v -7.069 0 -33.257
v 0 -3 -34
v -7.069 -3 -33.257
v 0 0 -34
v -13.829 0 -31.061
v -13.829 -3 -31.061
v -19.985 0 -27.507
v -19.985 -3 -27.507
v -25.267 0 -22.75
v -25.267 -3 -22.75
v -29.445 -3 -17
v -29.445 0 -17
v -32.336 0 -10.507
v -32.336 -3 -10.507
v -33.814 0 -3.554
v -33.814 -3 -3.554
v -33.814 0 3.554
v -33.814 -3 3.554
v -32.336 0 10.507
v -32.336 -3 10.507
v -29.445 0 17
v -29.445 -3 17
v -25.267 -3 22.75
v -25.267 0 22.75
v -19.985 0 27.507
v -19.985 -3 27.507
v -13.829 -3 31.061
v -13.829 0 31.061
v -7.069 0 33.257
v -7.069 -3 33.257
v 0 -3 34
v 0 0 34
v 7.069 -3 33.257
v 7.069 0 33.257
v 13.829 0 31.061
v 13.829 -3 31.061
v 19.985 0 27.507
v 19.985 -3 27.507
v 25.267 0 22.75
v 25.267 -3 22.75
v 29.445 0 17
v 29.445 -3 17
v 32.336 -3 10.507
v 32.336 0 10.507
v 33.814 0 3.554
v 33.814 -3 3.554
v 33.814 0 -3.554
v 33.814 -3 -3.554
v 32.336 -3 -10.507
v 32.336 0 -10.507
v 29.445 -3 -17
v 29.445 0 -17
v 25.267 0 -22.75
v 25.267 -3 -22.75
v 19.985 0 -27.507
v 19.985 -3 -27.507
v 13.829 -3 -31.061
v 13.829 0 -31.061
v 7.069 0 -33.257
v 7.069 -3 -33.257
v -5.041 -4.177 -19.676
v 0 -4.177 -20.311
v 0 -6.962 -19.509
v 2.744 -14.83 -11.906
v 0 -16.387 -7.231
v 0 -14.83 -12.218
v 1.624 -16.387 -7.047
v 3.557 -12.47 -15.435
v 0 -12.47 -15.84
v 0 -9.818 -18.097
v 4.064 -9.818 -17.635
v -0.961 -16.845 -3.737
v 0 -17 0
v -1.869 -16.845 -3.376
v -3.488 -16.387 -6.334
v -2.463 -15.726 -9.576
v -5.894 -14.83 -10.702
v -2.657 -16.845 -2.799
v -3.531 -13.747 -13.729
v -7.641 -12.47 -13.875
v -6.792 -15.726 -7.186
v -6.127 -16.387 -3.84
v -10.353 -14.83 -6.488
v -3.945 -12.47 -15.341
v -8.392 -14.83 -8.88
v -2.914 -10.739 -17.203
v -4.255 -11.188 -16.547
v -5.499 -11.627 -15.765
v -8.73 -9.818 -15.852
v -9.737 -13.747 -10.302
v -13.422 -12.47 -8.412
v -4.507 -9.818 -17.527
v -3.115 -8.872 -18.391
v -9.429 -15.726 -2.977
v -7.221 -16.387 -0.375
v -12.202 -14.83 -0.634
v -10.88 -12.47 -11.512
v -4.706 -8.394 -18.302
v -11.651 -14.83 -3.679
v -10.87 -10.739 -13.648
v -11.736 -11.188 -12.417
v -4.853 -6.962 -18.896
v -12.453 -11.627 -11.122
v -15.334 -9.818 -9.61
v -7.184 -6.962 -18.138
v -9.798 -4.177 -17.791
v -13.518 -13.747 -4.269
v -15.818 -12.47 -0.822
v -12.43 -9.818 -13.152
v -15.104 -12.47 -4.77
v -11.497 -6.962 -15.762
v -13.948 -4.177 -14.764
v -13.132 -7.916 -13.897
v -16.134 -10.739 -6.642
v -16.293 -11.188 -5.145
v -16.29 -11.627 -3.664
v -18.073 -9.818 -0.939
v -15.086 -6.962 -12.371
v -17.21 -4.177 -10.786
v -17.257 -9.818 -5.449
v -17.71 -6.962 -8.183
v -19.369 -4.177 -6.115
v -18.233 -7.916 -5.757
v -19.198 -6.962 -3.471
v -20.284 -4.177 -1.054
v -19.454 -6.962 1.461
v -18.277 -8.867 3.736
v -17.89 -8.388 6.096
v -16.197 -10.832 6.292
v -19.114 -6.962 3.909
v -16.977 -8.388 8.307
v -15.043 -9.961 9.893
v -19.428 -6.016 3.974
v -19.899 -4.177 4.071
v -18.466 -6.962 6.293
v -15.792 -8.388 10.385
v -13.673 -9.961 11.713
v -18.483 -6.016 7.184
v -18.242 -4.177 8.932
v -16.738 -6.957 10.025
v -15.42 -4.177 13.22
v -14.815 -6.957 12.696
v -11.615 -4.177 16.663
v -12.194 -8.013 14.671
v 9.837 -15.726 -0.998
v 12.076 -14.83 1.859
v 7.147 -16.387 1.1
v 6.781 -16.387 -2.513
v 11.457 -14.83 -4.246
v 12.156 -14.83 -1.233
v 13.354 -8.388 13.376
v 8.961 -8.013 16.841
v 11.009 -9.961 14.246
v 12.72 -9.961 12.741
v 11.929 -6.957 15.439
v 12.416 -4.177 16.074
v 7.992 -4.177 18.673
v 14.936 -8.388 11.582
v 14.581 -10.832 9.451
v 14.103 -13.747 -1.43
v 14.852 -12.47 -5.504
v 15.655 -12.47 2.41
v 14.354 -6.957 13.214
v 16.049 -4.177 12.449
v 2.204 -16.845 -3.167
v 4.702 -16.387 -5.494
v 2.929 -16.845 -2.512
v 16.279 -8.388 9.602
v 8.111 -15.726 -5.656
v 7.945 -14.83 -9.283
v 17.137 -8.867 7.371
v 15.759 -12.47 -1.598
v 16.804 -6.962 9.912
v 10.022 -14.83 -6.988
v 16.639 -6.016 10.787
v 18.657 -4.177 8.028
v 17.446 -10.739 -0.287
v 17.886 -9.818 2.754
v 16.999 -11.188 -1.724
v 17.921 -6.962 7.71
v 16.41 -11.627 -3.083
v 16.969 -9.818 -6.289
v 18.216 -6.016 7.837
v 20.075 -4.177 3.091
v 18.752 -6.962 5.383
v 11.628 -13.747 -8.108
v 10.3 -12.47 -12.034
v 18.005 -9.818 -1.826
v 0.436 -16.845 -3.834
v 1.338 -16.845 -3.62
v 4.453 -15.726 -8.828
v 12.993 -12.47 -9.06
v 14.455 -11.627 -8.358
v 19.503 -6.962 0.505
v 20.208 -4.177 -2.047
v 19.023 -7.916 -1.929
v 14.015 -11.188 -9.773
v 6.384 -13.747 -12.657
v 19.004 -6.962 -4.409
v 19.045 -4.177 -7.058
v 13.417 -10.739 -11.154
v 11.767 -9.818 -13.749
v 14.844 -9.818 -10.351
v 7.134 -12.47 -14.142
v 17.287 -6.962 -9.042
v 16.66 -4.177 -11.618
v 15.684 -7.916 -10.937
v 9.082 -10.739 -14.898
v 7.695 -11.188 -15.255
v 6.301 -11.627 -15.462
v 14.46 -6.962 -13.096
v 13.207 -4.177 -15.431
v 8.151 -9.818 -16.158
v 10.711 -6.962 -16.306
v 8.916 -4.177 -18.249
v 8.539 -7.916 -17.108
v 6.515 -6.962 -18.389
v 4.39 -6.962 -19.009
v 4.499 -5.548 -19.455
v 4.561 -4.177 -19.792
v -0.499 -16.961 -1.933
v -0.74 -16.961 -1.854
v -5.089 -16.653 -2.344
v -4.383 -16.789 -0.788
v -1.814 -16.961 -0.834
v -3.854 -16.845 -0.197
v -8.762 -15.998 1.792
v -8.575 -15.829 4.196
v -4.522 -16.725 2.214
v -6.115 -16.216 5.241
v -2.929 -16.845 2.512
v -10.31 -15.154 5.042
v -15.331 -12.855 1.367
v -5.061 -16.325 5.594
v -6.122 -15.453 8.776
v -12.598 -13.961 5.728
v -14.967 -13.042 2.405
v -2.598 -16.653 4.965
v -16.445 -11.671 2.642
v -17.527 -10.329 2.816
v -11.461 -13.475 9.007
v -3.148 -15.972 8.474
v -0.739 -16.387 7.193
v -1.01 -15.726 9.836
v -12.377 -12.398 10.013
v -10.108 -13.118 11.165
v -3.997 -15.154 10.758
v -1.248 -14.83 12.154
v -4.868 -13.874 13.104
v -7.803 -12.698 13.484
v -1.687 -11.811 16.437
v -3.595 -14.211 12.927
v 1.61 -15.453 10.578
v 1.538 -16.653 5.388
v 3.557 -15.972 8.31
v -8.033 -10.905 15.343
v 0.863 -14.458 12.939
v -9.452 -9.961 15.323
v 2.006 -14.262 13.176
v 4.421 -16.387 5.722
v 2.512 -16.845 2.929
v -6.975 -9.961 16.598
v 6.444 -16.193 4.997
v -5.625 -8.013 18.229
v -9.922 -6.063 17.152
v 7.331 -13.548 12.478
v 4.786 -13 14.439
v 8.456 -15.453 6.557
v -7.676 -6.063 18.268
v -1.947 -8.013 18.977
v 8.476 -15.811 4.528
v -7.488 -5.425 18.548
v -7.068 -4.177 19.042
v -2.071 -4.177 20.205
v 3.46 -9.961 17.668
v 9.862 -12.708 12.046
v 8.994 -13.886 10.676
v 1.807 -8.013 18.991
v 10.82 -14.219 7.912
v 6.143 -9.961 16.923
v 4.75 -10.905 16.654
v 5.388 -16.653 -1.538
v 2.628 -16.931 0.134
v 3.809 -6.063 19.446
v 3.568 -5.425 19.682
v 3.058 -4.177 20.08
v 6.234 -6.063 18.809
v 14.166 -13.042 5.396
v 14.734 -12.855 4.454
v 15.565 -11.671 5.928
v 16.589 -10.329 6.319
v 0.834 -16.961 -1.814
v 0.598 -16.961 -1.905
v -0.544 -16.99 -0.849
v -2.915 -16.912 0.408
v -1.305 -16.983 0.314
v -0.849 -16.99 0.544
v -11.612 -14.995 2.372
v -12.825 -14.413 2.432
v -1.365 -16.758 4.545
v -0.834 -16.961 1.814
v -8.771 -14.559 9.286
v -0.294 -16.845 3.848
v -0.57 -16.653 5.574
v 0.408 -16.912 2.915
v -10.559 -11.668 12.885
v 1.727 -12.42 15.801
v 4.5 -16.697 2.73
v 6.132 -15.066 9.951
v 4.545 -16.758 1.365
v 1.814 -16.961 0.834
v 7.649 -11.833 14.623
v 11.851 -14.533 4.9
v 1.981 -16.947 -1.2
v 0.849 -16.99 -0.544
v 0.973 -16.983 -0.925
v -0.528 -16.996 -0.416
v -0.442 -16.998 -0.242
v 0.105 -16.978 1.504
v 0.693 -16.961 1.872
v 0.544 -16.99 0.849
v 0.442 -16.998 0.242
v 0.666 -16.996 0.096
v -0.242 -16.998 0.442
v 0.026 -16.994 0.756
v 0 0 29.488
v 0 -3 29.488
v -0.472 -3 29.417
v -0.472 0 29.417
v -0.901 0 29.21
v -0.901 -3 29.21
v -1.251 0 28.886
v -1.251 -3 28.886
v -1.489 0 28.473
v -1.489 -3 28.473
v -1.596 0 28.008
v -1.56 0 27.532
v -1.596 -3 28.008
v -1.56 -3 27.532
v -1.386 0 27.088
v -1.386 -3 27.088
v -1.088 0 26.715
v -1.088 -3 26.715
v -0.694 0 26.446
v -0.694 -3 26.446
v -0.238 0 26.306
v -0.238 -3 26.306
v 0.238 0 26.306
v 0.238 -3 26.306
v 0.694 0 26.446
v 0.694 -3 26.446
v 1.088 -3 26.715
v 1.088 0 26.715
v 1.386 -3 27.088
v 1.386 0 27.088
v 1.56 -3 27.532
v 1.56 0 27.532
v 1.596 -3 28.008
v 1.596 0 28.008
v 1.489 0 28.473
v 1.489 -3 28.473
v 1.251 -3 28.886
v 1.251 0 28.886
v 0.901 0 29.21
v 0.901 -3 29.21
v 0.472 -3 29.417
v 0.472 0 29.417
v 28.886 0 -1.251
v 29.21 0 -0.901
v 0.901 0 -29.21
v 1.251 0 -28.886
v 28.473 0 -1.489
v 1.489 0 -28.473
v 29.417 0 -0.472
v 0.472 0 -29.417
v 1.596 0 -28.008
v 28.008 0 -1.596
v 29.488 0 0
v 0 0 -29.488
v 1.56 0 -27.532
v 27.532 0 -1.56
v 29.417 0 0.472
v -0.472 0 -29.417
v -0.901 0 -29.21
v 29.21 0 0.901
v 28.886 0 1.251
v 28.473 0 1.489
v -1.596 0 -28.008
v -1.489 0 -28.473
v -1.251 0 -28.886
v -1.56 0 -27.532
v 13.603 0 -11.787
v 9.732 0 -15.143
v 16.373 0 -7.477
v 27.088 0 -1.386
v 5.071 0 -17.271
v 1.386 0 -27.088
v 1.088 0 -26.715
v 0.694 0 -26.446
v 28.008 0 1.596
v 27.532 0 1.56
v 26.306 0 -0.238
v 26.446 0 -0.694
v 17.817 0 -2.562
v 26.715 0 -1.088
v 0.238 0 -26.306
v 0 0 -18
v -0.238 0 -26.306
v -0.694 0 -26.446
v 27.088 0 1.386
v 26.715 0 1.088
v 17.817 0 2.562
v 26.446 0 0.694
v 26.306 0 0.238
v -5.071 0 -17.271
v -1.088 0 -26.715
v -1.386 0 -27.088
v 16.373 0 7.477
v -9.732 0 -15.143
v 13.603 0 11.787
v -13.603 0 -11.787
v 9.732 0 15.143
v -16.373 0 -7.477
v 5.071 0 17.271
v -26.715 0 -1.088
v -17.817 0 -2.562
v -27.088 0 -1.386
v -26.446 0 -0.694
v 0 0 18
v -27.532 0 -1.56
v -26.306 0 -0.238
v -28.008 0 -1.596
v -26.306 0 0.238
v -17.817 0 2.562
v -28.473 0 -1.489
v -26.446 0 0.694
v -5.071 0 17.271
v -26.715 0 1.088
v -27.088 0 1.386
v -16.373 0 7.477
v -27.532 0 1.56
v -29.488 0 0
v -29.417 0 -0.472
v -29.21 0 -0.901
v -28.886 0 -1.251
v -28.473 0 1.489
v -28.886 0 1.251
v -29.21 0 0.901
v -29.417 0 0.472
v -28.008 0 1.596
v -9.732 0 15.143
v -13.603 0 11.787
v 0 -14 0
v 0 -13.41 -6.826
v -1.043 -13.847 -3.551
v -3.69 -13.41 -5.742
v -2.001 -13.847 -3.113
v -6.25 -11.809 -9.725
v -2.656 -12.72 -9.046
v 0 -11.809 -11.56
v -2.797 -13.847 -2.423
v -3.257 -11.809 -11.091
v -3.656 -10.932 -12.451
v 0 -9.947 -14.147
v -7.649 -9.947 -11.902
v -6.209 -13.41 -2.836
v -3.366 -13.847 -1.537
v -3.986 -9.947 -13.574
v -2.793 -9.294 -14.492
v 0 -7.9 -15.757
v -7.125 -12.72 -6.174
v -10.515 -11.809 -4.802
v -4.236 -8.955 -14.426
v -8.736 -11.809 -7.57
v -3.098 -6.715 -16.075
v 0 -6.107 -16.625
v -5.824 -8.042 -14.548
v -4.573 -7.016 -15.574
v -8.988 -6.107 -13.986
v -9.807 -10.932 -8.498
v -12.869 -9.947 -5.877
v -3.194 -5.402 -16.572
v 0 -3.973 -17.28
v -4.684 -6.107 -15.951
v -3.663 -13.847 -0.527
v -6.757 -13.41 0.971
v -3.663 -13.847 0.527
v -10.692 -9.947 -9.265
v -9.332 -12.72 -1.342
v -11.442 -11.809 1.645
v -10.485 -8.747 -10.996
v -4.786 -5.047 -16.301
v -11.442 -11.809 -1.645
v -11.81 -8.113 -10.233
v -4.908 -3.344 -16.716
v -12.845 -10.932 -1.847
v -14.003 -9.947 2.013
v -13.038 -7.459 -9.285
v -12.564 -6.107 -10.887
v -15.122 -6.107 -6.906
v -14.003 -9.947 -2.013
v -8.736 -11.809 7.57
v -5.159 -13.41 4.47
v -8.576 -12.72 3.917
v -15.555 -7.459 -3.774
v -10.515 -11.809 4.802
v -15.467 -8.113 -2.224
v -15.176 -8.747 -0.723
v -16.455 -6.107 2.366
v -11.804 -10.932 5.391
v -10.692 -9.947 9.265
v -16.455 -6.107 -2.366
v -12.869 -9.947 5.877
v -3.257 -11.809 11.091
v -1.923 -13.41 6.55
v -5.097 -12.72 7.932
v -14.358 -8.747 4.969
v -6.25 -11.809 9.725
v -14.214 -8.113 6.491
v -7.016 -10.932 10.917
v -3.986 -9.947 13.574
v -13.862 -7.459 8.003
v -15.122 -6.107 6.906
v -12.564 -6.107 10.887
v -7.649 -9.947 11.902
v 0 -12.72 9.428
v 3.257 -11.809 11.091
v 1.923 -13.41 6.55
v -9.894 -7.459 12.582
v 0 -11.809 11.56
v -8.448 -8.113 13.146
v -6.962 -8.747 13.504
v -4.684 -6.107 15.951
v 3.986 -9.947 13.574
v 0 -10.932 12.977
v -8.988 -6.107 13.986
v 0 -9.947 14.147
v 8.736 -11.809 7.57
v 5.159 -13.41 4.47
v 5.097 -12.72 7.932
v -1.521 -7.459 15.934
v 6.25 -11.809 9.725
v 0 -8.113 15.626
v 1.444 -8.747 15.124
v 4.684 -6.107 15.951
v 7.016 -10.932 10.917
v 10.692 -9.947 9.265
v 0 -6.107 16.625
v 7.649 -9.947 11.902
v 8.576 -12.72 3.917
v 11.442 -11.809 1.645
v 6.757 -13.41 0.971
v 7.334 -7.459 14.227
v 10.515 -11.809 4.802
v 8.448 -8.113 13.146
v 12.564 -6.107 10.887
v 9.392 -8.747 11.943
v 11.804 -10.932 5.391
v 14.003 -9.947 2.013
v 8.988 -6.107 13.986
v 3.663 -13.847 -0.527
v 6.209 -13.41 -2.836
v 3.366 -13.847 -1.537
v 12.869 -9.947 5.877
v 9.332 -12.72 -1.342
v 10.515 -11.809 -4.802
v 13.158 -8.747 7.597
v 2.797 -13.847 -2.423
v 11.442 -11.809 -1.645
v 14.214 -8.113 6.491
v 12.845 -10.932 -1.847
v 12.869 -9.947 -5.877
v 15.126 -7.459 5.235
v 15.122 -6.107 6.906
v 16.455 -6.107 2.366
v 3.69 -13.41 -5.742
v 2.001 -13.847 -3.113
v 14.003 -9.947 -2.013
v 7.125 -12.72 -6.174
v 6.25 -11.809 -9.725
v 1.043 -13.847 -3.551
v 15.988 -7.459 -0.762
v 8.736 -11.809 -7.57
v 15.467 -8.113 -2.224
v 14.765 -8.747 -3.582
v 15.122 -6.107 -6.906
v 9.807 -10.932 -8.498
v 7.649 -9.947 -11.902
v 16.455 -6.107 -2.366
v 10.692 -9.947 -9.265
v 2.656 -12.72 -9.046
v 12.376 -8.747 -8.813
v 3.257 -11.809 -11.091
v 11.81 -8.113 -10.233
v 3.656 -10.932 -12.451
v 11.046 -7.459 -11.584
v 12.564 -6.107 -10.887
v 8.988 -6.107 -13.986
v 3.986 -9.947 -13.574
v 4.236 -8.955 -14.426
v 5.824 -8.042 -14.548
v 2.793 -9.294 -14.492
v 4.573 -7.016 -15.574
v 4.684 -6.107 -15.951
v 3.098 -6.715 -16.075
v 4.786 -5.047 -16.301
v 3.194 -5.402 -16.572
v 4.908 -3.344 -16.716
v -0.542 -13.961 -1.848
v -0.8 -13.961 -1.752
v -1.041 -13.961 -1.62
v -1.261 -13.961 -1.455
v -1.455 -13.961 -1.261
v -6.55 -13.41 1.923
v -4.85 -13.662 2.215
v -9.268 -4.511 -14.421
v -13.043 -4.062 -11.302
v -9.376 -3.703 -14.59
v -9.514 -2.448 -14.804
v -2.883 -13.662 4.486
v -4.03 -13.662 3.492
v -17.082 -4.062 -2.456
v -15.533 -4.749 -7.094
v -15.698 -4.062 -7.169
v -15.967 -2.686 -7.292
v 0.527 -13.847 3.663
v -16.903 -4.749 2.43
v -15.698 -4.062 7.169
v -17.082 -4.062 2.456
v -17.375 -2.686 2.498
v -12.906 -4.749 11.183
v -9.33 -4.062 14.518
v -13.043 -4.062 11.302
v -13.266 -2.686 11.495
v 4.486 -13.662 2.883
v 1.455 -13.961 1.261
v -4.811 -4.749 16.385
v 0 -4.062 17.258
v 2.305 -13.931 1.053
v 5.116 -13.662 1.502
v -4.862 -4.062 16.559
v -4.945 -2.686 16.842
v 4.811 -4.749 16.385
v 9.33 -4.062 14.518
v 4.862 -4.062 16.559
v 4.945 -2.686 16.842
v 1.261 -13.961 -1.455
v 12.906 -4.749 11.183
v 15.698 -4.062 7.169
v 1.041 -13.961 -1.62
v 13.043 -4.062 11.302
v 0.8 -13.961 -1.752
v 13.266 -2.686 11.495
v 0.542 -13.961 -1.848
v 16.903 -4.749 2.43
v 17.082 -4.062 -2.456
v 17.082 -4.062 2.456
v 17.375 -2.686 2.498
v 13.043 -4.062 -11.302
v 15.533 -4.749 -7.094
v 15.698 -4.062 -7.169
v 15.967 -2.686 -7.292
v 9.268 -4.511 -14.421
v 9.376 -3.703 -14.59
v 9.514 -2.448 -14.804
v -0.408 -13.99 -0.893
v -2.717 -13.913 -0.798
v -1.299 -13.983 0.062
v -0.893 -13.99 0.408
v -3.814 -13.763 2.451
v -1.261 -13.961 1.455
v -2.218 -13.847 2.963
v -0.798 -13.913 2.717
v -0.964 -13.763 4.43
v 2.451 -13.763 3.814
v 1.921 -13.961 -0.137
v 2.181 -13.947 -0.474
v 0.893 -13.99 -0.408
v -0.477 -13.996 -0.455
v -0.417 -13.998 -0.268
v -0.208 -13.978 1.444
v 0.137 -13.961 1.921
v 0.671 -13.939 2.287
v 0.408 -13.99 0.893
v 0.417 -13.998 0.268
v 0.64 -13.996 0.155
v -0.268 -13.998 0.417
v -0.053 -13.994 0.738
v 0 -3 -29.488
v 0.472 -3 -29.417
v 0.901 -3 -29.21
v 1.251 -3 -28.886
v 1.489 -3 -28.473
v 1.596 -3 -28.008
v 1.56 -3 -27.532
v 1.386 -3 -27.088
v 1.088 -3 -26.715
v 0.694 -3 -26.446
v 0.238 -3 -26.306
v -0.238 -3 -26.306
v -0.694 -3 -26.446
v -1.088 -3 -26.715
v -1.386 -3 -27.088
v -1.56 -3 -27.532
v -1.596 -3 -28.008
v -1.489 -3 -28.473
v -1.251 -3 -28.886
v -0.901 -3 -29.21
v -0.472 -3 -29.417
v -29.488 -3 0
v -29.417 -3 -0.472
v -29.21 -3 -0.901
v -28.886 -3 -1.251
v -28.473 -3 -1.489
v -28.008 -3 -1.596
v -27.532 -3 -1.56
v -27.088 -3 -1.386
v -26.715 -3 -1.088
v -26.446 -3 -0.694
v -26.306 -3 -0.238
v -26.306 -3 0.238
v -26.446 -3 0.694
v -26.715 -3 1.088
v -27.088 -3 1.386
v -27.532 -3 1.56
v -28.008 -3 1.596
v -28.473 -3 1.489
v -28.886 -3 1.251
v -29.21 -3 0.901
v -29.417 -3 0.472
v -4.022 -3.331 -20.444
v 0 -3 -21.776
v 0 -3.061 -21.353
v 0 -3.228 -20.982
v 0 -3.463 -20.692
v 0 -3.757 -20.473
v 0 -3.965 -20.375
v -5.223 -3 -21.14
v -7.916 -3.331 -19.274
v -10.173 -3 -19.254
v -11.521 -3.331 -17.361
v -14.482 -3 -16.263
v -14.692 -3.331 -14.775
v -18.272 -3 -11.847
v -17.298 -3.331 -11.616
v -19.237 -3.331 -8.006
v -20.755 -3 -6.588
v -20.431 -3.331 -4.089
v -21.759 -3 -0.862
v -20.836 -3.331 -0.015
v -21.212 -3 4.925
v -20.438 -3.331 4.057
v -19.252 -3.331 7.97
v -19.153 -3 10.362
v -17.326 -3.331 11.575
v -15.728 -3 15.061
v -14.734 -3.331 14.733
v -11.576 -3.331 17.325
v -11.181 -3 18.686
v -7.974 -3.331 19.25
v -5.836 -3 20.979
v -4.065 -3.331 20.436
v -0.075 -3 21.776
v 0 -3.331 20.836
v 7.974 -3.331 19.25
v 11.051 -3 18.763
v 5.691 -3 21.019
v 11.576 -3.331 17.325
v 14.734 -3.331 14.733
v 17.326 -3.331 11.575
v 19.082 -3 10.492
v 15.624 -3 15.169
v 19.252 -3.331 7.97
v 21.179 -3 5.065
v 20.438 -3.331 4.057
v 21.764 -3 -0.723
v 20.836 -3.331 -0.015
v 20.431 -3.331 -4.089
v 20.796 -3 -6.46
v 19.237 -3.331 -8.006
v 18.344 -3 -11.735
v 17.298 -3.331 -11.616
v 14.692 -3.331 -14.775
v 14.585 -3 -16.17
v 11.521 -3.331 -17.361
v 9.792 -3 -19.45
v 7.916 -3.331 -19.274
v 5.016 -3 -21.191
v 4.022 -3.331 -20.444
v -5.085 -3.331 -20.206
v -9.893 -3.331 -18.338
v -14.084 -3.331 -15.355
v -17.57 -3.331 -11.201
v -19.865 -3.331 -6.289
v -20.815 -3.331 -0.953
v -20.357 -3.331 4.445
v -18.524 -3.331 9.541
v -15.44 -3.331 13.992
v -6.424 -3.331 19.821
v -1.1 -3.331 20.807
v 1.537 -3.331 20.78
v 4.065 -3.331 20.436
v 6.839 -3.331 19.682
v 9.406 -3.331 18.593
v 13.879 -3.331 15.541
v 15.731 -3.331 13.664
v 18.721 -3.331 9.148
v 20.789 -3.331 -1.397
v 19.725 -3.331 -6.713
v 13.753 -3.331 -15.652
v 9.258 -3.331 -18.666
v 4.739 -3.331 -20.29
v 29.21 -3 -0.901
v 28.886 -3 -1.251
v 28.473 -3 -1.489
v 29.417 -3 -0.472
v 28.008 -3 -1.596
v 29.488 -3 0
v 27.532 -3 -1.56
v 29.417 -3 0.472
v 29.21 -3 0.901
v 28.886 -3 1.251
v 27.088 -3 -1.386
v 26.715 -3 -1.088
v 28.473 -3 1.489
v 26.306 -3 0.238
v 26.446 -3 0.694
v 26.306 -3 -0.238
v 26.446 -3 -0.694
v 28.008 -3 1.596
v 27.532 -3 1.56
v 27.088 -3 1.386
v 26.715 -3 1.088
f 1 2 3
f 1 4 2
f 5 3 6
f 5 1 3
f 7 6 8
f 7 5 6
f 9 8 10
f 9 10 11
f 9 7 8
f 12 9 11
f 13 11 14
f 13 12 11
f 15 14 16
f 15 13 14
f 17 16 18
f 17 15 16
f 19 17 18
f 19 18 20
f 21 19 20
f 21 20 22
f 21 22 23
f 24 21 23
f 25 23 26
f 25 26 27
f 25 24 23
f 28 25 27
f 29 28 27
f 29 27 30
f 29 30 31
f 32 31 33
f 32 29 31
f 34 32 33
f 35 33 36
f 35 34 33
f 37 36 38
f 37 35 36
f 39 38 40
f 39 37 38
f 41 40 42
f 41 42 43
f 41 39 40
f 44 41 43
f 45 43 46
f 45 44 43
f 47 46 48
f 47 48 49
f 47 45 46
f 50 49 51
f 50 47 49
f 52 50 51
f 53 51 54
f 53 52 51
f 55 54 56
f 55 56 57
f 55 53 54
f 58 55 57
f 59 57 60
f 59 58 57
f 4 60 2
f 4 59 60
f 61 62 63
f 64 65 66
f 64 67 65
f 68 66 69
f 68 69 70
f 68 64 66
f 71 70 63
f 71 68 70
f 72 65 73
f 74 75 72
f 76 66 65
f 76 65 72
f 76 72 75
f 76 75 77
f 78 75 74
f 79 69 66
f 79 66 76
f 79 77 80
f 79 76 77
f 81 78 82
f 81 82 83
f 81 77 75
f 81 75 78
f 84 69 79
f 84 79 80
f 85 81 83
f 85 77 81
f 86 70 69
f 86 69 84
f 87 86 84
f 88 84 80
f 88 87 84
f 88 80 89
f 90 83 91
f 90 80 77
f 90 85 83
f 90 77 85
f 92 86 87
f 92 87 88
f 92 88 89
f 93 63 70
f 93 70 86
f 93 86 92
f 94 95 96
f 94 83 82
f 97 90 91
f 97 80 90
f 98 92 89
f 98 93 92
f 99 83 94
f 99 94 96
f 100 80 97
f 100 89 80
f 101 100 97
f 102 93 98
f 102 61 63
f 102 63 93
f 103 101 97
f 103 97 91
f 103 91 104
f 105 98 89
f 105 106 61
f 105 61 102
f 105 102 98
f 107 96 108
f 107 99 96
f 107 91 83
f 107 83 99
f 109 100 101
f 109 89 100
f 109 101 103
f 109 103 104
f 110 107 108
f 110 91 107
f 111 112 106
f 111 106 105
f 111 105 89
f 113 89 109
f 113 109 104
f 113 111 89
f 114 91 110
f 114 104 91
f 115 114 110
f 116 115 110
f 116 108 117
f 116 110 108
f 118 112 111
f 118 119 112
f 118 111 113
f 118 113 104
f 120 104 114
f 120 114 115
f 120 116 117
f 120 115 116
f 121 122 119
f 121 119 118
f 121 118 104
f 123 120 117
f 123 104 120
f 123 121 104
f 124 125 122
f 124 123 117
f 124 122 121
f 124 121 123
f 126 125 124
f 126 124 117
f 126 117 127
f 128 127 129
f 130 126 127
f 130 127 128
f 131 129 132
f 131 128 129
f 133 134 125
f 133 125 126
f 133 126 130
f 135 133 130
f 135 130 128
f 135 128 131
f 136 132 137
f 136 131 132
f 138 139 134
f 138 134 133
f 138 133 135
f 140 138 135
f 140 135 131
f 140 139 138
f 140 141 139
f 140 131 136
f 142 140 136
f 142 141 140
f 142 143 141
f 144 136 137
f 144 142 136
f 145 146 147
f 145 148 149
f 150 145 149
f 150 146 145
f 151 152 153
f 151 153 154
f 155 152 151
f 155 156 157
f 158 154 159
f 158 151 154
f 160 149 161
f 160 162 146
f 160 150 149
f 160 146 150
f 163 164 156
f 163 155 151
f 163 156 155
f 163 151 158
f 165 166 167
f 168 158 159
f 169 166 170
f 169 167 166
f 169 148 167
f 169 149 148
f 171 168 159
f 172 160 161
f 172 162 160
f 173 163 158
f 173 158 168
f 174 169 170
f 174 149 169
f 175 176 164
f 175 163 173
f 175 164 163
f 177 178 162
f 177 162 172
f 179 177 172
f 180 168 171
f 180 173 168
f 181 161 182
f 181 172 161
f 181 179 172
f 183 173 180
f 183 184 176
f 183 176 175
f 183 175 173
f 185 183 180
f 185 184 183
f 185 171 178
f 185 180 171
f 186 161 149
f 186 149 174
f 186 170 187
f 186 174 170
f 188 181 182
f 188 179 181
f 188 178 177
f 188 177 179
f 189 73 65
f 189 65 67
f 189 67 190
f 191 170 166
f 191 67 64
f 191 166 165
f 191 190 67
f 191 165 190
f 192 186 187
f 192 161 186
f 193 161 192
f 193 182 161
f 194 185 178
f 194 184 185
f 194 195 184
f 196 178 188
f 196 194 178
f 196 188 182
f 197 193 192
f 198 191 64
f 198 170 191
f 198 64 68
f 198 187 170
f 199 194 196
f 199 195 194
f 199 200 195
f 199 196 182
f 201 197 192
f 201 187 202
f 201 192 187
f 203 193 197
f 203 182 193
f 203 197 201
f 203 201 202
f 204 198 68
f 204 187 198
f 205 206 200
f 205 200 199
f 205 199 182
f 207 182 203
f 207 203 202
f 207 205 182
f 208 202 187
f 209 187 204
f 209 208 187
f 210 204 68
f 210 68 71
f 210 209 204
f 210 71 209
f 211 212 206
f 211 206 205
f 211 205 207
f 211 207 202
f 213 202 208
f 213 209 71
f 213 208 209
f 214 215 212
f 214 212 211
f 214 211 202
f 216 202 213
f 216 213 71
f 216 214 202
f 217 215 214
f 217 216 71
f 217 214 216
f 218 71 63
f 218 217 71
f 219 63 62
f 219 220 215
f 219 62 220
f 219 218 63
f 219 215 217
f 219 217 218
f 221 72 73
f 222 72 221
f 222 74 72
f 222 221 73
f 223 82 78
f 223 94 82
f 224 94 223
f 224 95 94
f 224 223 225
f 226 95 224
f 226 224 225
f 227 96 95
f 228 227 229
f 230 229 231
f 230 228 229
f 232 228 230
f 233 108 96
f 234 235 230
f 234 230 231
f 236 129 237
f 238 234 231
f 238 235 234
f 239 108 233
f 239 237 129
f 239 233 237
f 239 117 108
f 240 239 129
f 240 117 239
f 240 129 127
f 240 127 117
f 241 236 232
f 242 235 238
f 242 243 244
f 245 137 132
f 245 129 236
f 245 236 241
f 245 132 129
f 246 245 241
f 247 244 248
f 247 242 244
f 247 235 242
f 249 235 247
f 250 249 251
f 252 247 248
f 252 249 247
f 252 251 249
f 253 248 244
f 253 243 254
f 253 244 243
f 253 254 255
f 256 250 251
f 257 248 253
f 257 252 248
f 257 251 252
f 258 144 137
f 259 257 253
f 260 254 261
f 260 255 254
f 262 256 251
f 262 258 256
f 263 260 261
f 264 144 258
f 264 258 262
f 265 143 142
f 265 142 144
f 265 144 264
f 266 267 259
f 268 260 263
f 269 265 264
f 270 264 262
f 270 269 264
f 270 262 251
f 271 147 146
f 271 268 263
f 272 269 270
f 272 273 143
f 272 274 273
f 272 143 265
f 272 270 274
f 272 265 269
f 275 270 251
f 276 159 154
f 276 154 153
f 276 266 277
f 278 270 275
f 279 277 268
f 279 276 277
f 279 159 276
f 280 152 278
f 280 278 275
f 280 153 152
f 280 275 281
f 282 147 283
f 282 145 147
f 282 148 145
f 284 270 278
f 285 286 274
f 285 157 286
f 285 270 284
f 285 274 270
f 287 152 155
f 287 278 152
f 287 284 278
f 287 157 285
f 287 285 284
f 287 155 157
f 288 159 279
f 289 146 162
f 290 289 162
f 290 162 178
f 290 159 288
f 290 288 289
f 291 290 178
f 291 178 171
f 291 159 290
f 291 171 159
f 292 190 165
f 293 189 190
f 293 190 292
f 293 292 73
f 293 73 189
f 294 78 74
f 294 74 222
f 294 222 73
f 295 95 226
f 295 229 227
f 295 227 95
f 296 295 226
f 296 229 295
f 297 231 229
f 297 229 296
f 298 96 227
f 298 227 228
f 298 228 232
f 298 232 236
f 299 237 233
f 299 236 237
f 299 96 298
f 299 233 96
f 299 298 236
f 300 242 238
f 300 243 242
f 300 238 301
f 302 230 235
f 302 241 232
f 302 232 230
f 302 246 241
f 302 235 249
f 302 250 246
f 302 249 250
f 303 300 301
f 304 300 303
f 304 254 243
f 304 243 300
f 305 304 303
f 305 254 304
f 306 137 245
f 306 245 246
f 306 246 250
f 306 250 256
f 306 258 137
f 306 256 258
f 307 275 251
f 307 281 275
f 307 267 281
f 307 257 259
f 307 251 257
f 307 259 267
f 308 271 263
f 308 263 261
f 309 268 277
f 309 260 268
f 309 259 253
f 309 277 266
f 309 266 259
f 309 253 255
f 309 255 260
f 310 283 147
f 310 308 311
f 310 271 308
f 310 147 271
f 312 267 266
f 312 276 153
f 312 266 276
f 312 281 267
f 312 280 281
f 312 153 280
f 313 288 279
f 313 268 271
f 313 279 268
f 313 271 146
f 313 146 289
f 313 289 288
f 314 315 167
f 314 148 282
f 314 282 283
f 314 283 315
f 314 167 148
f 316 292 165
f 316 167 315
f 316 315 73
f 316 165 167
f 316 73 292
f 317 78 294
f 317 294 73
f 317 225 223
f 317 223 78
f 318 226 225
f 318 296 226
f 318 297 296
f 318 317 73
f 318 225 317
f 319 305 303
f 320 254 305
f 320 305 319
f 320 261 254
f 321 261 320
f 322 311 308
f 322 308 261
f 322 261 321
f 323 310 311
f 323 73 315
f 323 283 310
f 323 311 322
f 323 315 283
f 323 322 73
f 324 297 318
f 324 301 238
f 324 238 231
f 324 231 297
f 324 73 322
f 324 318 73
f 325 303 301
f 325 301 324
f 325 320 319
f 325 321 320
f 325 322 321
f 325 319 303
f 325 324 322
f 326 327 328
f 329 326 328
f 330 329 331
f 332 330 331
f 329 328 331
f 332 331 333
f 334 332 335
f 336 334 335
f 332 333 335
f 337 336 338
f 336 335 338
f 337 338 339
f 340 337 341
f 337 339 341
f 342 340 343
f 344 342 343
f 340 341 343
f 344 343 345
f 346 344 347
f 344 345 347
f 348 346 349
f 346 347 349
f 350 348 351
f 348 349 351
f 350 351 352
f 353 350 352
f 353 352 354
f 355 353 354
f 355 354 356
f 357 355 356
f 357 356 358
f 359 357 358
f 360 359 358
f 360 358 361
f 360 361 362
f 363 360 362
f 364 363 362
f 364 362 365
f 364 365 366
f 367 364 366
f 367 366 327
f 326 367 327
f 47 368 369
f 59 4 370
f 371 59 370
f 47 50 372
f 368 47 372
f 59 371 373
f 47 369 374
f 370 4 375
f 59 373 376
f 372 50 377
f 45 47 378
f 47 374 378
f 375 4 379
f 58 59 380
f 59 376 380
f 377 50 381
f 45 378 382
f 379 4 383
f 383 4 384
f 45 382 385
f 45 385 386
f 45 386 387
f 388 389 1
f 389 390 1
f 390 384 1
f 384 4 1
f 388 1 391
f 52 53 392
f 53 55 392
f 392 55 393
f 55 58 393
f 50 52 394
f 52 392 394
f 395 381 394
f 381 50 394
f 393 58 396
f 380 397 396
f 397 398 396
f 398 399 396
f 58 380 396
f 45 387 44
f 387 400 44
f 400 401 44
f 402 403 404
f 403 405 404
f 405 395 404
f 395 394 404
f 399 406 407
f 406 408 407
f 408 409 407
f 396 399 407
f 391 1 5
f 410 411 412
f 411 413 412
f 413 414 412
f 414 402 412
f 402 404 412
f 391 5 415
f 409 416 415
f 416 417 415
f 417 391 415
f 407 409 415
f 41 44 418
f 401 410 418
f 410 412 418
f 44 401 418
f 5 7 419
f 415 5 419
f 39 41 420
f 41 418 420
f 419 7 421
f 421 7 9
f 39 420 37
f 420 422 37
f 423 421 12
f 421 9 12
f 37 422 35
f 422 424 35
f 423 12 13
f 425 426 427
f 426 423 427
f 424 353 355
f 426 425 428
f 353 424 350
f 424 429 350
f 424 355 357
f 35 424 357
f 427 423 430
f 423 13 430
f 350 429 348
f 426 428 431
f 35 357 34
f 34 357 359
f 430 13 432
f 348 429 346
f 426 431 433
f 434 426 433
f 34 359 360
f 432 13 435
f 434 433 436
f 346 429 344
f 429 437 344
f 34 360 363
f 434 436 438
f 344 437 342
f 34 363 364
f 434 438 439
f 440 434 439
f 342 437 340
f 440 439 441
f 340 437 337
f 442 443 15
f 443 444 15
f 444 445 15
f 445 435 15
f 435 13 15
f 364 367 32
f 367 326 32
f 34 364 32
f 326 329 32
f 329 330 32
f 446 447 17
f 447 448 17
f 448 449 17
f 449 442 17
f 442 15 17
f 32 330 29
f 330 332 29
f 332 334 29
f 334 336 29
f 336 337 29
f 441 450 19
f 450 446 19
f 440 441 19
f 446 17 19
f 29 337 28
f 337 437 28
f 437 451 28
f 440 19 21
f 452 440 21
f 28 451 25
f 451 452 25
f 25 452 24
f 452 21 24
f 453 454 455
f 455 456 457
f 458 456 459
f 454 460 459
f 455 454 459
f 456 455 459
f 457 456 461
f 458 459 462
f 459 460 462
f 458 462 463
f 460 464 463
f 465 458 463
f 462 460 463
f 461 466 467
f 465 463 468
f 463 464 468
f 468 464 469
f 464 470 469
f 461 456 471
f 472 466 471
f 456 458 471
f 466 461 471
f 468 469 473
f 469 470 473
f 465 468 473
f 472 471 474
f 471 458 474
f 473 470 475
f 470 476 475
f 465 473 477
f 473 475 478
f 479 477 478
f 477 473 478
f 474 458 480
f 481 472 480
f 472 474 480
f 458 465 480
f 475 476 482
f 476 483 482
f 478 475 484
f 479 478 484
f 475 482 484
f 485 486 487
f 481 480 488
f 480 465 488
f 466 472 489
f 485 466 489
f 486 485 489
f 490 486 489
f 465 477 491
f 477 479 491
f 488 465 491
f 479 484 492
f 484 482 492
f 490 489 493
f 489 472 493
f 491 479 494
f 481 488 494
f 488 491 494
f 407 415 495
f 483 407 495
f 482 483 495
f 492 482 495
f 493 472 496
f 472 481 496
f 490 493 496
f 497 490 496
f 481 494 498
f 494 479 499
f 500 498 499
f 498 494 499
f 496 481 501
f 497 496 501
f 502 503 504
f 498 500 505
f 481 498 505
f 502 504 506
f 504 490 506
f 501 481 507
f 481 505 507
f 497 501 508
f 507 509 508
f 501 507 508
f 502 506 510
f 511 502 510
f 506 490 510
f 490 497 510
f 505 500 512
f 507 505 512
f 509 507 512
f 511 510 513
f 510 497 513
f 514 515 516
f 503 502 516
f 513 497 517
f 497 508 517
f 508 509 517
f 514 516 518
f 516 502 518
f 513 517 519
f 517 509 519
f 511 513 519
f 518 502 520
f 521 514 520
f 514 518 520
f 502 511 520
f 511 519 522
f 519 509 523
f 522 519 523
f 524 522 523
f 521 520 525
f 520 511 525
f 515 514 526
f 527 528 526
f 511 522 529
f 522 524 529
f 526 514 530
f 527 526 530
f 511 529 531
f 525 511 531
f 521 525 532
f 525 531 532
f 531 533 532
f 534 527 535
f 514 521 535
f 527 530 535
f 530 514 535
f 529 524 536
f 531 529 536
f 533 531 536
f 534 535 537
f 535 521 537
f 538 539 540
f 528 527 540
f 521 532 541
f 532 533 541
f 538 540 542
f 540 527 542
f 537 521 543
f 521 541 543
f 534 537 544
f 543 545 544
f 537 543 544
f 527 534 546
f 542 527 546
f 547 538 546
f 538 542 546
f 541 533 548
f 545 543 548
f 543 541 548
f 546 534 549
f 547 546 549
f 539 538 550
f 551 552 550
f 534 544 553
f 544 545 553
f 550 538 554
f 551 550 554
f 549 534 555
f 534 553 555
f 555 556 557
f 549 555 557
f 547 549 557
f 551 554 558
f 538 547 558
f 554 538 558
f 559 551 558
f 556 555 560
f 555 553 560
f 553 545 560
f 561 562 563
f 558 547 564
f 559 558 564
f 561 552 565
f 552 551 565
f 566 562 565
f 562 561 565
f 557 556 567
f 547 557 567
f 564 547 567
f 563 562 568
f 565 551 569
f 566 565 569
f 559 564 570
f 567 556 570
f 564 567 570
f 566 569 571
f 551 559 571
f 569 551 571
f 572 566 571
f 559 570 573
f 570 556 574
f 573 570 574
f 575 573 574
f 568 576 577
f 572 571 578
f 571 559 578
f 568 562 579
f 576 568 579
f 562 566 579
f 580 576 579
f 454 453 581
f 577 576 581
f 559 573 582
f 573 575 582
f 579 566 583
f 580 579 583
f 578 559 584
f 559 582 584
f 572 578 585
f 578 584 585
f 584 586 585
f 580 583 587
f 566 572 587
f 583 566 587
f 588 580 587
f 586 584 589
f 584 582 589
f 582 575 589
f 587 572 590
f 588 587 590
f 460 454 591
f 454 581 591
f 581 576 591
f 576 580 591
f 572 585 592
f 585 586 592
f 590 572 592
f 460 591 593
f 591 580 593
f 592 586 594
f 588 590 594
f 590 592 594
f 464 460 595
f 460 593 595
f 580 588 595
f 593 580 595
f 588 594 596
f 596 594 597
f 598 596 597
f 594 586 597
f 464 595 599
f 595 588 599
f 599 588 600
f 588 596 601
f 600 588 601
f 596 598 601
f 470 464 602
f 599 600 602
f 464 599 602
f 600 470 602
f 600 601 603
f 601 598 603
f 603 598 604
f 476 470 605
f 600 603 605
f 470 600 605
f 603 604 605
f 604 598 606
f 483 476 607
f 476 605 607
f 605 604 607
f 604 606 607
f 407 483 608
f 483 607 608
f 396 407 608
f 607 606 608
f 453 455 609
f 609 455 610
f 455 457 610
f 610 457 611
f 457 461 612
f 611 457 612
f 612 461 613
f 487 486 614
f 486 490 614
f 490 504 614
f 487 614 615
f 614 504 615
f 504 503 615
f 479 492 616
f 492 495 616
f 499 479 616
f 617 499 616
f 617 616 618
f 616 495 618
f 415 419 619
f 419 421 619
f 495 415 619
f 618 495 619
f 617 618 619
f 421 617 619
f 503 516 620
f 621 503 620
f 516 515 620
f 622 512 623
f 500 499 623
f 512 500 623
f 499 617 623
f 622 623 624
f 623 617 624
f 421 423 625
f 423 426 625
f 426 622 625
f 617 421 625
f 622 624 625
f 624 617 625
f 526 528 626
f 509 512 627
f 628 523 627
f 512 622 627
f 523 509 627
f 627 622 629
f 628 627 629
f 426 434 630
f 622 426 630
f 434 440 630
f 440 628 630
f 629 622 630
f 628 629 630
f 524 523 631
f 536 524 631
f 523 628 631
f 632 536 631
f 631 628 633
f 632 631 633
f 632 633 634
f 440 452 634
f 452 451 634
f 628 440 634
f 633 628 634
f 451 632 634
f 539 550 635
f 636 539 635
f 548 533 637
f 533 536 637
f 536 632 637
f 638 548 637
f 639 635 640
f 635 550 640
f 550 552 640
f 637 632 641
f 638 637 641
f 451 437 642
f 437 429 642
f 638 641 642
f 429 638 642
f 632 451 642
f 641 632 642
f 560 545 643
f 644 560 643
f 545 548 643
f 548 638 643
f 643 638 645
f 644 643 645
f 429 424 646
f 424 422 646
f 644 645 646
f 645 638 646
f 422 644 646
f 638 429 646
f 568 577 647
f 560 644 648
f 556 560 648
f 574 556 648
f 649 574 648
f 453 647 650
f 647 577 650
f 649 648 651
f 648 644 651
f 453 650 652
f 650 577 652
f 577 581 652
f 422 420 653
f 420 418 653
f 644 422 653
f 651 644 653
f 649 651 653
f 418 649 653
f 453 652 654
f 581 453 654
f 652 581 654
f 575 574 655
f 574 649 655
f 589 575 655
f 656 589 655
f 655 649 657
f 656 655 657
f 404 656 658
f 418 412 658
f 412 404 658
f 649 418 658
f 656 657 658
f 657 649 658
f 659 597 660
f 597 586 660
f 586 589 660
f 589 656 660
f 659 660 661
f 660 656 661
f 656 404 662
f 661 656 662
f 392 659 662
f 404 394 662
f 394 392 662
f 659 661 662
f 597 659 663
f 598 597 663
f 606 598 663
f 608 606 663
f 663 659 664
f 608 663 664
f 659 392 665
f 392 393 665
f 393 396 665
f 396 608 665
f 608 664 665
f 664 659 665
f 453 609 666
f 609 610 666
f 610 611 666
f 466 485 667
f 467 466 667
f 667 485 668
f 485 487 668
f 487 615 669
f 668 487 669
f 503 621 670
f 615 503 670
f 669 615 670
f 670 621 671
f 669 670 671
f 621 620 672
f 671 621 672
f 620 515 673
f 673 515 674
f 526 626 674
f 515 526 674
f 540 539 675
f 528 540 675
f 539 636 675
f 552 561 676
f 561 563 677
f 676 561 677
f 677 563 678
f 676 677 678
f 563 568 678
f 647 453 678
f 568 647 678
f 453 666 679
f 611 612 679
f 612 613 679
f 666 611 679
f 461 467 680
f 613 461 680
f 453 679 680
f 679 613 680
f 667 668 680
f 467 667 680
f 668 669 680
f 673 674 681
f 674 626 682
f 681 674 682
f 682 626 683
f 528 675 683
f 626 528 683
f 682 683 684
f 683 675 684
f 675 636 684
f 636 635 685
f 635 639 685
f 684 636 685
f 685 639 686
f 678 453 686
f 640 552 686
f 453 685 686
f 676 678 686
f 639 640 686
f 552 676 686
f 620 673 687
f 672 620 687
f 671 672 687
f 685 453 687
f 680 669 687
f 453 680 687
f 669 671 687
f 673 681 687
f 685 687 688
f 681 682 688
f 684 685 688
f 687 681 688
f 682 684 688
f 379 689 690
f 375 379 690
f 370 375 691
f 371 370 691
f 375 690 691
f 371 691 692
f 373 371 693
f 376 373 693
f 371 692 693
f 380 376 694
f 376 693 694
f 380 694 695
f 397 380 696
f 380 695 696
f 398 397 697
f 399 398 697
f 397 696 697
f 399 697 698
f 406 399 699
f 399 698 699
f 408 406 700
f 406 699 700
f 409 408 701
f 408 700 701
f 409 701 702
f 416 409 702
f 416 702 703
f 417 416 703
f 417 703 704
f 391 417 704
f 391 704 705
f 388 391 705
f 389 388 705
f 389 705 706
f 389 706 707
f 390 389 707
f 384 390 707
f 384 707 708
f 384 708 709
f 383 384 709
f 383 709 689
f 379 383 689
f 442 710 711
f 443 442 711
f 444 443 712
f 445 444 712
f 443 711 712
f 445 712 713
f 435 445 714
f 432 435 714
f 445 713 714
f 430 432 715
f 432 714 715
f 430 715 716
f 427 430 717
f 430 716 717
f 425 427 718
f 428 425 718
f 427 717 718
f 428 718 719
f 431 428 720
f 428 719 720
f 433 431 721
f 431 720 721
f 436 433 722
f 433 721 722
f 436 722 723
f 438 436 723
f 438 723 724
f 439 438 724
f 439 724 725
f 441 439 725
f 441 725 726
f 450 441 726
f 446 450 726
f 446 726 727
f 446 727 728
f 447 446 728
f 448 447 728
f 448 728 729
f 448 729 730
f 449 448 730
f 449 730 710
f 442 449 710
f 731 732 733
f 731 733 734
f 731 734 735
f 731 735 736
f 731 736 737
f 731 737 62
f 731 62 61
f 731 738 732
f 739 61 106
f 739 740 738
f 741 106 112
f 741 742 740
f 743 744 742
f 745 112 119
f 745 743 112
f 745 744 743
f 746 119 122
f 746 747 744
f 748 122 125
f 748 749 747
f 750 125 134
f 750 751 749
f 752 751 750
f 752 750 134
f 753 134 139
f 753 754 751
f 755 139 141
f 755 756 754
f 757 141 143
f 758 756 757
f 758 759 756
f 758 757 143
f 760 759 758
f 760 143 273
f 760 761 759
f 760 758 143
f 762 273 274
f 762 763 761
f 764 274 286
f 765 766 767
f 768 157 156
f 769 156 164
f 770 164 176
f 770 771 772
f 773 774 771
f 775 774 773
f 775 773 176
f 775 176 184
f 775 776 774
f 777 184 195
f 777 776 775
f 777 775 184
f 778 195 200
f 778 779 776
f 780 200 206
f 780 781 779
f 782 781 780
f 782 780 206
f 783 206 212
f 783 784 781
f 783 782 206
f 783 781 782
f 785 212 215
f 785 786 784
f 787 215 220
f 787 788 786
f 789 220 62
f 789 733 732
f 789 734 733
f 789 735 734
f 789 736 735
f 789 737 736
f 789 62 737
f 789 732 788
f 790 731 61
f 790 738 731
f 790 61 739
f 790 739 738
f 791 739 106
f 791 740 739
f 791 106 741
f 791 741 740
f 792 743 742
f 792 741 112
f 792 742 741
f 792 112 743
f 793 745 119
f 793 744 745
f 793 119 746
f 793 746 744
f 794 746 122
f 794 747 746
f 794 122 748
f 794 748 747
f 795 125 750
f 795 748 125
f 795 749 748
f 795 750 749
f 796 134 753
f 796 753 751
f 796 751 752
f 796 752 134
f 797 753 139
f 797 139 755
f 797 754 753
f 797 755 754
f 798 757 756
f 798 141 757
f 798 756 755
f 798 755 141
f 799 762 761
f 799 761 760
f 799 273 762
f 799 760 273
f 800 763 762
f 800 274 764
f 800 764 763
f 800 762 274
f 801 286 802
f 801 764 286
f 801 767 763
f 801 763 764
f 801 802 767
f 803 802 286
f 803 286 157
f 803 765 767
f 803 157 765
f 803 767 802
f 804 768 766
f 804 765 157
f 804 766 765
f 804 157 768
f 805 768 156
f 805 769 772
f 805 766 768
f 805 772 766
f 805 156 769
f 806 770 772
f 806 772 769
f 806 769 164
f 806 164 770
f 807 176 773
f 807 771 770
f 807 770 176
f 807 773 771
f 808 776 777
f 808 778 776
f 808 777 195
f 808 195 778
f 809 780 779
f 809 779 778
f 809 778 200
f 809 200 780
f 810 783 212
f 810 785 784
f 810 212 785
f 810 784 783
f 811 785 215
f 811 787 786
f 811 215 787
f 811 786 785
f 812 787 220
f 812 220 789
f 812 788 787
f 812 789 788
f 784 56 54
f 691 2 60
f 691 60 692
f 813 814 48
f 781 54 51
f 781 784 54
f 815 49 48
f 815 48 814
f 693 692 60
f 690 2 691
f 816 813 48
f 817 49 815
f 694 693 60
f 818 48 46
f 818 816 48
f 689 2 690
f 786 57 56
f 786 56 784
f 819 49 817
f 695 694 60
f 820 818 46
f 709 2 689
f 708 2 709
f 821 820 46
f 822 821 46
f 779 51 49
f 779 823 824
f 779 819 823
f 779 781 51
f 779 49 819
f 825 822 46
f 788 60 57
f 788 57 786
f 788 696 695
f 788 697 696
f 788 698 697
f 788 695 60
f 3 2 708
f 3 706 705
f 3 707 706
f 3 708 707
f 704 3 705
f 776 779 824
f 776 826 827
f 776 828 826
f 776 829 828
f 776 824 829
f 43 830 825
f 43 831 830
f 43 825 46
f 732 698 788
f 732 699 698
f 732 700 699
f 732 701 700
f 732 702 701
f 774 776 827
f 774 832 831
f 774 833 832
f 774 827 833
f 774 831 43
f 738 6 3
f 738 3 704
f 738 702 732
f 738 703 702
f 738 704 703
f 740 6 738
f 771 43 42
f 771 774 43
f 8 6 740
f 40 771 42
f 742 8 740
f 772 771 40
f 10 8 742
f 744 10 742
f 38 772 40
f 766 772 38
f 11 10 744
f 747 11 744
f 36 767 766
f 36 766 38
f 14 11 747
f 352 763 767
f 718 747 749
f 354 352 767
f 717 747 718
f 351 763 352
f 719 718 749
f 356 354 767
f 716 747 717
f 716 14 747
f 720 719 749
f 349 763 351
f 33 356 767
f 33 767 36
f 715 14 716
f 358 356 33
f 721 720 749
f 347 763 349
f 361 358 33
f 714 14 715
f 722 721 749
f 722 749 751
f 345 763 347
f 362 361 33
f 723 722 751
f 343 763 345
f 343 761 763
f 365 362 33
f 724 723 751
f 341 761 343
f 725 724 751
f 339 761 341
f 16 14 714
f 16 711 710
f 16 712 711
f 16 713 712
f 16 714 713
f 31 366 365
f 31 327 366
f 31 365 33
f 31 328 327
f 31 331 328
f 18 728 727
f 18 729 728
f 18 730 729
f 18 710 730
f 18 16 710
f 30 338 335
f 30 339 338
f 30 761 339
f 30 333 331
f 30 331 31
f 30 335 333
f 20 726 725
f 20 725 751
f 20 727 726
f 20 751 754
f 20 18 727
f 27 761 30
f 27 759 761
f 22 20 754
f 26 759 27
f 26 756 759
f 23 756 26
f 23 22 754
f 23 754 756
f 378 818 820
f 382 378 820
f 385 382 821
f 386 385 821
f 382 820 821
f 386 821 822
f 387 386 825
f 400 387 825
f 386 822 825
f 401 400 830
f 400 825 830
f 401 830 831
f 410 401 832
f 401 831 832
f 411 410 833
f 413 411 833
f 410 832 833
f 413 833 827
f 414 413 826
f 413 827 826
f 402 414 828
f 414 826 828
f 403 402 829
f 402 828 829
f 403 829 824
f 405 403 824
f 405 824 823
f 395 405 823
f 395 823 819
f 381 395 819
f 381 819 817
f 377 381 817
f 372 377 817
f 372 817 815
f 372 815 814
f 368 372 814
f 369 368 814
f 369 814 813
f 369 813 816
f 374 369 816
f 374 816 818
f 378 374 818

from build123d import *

# Parameters (mm, degrees)
SKETCH3_W          = 13.453428953
SKETCH3_H          = 3
FILLET1_R          = 1.5
SKETCH4_R          = 1.6
CUT_EXTRUDE1_DEPTH = 51.079936266
CIRPATTERN1_COUNT  = 4


with BuildPart() as part:
    # Sketch1 → Revolve1 (revolve)
    with BuildSketch(Plane.XY, mode=Mode.PRIVATE) as revolve1_sk:
        with BuildLine():
            Line((0, -17), (0, -14))
            add(Edge.make_bspline(
                [(0, -14), (16.389539142, -14), (17.019517421, -6.054809845), (18, 0)],
                knots=[0, 0, 0, 0, 1, 1, 1, 1], degree=3))
            Line((18, 0), (20.961422891, 0))
            Line((20.961422891, 0), (20.961422891, -0.479556523))
            add(Edge.make_bspline(
                [(0, -17), (0.528573753, -17), (1.605388754, -16.983569549), (3.600168077, -16.886379692), (5.915984959, -16.646675198), (8.402442715, -16.175166648), (11.369715767, -15.30568509), (14.467863823, -13.768247798), (17.226954494, -11.272431323), (19.016831185, -8.41451175), (20.041971454, -5.53113124), (20.509739393, -3.277227242), (20.784228644, -1.605380322), (20.899427173, -0.862400942), (20.961422891, -0.479556523)],
                knots=[0, 0, 0, 0, 0.03125, 0.0625, 0.125, 0.1875, 0.25, 0.375, 0.5, 0.625, 0.75, 0.875, 0.9375, 1, 1, 1, 1], degree=3))
        make_face()
    revolve(revolve1_sk.sketch.rotate(Axis((0, -17, 0), (0, 1, 0)), 90), axis=Axis((0, -17, 0), (0, 1, 0)))

    # Sketch3 → Revolve2 (revolve)
    with BuildSketch(Plane.XY, mode=Mode.PRIVATE) as revolve2_sk:
        with Locations((27.273285524, -1.5)):
            Rectangle(SKETCH3_W, SKETCH3_H)
    revolve(revolve2_sk.sketch.rotate(Axis((0, 0, 0), (0, 1, 0)), 90), axis=Axis((0, 0, 0), (0, 1, 0)))

    # Fillet1
    fillet1_edges = [part.edges().sort_by_distance(p)[0] for p in [
        (0, -3, 20.546571047),
    ]]
    fillet(fillet1_edges, radius=FILLET1_R)

    # Sketch4 → Cut-Extrude1 (cut, through all)
    with BuildSketch(Plane.XZ.offset(3)):
        with Locations(Location((0, -27.888022688, 0), (0, 0, 270))):
            Circle(SKETCH4_R)
    cut_extrude1 = extrude(amount=-CUT_EXTRUDE1_DEPTH, mode=Mode.SUBTRACT)

    # CirPattern1: Cut-Extrude1 ×4 about axis
    cirpattern1_axis = Axis((0, 0, 0), (0, 1, 0))
    for i in range(1, CIRPATTERN1_COUNT):
        add(cut_extrude1.rotate(cirpattern1_axis, i * 360 / CIRPATTERN1_COUNT), mode=Mode.SUBTRACT)


solid = part.part
